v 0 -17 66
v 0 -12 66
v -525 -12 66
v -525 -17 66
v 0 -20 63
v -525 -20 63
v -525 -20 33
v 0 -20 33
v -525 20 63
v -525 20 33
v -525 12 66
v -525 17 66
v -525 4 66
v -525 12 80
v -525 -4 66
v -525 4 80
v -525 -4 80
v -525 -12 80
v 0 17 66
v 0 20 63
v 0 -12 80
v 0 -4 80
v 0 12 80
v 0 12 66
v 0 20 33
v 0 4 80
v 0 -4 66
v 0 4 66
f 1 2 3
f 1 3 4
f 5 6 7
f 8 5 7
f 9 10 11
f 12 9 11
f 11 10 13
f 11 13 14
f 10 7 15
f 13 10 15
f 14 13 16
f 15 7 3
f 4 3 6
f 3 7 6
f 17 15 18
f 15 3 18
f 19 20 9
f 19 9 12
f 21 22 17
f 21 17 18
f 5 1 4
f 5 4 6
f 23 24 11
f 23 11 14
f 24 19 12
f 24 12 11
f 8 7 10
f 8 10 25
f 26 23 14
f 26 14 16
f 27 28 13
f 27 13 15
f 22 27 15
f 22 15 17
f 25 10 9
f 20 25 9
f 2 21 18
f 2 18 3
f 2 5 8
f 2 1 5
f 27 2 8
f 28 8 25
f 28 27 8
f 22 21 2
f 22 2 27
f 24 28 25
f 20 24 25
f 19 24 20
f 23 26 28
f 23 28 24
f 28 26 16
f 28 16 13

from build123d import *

# Parameters (mm, degrees)
F0_W     = 40
F0_H     = 19
F2_DEPTH = 565
F1_W     = 80
F1_H     = 100
F3_DEPTH = 25
F4_W     = 565
F4_H     = 19
F5_DEPTH = 40


with BuildPart() as f2:
    # F0 (on Right) → F2 (new body)
    with BuildSketch(Plane.YZ):
        with Locations((0, 23.5)):
            Rectangle(F0_W, F0_H)
        Polygon((20, 33), (20, 63), (17, 66), (12, 66), (12, 80), (4, 80), (4, 66), (-4, 66), (-4, 80), (-12, 80), (-12, 66), (-17, 66), (-20, 63), (-20, 33), align=None)
    extrude(amount=-F2_DEPTH)

    # F1 (on Front) → F3 (cut, symmetric)
    with BuildSketch(Plane.XZ):
        with Locations((-565, 83)):
            Rectangle(F1_W, F1_H)
    extrude(amount=F3_DEPTH, both=True, mode=Mode.SUBTRACT)

    # F4 (on face) → F5 (cut, through all)
    with BuildSketch(Plane.XZ.offset(20)):
        with Locations((-282.5, 23.5)):
            Rectangle(F4_W, F4_H)
    extrude(amount=-F5_DEPTH, mode=Mode.SUBTRACT)


solid = f2.part
